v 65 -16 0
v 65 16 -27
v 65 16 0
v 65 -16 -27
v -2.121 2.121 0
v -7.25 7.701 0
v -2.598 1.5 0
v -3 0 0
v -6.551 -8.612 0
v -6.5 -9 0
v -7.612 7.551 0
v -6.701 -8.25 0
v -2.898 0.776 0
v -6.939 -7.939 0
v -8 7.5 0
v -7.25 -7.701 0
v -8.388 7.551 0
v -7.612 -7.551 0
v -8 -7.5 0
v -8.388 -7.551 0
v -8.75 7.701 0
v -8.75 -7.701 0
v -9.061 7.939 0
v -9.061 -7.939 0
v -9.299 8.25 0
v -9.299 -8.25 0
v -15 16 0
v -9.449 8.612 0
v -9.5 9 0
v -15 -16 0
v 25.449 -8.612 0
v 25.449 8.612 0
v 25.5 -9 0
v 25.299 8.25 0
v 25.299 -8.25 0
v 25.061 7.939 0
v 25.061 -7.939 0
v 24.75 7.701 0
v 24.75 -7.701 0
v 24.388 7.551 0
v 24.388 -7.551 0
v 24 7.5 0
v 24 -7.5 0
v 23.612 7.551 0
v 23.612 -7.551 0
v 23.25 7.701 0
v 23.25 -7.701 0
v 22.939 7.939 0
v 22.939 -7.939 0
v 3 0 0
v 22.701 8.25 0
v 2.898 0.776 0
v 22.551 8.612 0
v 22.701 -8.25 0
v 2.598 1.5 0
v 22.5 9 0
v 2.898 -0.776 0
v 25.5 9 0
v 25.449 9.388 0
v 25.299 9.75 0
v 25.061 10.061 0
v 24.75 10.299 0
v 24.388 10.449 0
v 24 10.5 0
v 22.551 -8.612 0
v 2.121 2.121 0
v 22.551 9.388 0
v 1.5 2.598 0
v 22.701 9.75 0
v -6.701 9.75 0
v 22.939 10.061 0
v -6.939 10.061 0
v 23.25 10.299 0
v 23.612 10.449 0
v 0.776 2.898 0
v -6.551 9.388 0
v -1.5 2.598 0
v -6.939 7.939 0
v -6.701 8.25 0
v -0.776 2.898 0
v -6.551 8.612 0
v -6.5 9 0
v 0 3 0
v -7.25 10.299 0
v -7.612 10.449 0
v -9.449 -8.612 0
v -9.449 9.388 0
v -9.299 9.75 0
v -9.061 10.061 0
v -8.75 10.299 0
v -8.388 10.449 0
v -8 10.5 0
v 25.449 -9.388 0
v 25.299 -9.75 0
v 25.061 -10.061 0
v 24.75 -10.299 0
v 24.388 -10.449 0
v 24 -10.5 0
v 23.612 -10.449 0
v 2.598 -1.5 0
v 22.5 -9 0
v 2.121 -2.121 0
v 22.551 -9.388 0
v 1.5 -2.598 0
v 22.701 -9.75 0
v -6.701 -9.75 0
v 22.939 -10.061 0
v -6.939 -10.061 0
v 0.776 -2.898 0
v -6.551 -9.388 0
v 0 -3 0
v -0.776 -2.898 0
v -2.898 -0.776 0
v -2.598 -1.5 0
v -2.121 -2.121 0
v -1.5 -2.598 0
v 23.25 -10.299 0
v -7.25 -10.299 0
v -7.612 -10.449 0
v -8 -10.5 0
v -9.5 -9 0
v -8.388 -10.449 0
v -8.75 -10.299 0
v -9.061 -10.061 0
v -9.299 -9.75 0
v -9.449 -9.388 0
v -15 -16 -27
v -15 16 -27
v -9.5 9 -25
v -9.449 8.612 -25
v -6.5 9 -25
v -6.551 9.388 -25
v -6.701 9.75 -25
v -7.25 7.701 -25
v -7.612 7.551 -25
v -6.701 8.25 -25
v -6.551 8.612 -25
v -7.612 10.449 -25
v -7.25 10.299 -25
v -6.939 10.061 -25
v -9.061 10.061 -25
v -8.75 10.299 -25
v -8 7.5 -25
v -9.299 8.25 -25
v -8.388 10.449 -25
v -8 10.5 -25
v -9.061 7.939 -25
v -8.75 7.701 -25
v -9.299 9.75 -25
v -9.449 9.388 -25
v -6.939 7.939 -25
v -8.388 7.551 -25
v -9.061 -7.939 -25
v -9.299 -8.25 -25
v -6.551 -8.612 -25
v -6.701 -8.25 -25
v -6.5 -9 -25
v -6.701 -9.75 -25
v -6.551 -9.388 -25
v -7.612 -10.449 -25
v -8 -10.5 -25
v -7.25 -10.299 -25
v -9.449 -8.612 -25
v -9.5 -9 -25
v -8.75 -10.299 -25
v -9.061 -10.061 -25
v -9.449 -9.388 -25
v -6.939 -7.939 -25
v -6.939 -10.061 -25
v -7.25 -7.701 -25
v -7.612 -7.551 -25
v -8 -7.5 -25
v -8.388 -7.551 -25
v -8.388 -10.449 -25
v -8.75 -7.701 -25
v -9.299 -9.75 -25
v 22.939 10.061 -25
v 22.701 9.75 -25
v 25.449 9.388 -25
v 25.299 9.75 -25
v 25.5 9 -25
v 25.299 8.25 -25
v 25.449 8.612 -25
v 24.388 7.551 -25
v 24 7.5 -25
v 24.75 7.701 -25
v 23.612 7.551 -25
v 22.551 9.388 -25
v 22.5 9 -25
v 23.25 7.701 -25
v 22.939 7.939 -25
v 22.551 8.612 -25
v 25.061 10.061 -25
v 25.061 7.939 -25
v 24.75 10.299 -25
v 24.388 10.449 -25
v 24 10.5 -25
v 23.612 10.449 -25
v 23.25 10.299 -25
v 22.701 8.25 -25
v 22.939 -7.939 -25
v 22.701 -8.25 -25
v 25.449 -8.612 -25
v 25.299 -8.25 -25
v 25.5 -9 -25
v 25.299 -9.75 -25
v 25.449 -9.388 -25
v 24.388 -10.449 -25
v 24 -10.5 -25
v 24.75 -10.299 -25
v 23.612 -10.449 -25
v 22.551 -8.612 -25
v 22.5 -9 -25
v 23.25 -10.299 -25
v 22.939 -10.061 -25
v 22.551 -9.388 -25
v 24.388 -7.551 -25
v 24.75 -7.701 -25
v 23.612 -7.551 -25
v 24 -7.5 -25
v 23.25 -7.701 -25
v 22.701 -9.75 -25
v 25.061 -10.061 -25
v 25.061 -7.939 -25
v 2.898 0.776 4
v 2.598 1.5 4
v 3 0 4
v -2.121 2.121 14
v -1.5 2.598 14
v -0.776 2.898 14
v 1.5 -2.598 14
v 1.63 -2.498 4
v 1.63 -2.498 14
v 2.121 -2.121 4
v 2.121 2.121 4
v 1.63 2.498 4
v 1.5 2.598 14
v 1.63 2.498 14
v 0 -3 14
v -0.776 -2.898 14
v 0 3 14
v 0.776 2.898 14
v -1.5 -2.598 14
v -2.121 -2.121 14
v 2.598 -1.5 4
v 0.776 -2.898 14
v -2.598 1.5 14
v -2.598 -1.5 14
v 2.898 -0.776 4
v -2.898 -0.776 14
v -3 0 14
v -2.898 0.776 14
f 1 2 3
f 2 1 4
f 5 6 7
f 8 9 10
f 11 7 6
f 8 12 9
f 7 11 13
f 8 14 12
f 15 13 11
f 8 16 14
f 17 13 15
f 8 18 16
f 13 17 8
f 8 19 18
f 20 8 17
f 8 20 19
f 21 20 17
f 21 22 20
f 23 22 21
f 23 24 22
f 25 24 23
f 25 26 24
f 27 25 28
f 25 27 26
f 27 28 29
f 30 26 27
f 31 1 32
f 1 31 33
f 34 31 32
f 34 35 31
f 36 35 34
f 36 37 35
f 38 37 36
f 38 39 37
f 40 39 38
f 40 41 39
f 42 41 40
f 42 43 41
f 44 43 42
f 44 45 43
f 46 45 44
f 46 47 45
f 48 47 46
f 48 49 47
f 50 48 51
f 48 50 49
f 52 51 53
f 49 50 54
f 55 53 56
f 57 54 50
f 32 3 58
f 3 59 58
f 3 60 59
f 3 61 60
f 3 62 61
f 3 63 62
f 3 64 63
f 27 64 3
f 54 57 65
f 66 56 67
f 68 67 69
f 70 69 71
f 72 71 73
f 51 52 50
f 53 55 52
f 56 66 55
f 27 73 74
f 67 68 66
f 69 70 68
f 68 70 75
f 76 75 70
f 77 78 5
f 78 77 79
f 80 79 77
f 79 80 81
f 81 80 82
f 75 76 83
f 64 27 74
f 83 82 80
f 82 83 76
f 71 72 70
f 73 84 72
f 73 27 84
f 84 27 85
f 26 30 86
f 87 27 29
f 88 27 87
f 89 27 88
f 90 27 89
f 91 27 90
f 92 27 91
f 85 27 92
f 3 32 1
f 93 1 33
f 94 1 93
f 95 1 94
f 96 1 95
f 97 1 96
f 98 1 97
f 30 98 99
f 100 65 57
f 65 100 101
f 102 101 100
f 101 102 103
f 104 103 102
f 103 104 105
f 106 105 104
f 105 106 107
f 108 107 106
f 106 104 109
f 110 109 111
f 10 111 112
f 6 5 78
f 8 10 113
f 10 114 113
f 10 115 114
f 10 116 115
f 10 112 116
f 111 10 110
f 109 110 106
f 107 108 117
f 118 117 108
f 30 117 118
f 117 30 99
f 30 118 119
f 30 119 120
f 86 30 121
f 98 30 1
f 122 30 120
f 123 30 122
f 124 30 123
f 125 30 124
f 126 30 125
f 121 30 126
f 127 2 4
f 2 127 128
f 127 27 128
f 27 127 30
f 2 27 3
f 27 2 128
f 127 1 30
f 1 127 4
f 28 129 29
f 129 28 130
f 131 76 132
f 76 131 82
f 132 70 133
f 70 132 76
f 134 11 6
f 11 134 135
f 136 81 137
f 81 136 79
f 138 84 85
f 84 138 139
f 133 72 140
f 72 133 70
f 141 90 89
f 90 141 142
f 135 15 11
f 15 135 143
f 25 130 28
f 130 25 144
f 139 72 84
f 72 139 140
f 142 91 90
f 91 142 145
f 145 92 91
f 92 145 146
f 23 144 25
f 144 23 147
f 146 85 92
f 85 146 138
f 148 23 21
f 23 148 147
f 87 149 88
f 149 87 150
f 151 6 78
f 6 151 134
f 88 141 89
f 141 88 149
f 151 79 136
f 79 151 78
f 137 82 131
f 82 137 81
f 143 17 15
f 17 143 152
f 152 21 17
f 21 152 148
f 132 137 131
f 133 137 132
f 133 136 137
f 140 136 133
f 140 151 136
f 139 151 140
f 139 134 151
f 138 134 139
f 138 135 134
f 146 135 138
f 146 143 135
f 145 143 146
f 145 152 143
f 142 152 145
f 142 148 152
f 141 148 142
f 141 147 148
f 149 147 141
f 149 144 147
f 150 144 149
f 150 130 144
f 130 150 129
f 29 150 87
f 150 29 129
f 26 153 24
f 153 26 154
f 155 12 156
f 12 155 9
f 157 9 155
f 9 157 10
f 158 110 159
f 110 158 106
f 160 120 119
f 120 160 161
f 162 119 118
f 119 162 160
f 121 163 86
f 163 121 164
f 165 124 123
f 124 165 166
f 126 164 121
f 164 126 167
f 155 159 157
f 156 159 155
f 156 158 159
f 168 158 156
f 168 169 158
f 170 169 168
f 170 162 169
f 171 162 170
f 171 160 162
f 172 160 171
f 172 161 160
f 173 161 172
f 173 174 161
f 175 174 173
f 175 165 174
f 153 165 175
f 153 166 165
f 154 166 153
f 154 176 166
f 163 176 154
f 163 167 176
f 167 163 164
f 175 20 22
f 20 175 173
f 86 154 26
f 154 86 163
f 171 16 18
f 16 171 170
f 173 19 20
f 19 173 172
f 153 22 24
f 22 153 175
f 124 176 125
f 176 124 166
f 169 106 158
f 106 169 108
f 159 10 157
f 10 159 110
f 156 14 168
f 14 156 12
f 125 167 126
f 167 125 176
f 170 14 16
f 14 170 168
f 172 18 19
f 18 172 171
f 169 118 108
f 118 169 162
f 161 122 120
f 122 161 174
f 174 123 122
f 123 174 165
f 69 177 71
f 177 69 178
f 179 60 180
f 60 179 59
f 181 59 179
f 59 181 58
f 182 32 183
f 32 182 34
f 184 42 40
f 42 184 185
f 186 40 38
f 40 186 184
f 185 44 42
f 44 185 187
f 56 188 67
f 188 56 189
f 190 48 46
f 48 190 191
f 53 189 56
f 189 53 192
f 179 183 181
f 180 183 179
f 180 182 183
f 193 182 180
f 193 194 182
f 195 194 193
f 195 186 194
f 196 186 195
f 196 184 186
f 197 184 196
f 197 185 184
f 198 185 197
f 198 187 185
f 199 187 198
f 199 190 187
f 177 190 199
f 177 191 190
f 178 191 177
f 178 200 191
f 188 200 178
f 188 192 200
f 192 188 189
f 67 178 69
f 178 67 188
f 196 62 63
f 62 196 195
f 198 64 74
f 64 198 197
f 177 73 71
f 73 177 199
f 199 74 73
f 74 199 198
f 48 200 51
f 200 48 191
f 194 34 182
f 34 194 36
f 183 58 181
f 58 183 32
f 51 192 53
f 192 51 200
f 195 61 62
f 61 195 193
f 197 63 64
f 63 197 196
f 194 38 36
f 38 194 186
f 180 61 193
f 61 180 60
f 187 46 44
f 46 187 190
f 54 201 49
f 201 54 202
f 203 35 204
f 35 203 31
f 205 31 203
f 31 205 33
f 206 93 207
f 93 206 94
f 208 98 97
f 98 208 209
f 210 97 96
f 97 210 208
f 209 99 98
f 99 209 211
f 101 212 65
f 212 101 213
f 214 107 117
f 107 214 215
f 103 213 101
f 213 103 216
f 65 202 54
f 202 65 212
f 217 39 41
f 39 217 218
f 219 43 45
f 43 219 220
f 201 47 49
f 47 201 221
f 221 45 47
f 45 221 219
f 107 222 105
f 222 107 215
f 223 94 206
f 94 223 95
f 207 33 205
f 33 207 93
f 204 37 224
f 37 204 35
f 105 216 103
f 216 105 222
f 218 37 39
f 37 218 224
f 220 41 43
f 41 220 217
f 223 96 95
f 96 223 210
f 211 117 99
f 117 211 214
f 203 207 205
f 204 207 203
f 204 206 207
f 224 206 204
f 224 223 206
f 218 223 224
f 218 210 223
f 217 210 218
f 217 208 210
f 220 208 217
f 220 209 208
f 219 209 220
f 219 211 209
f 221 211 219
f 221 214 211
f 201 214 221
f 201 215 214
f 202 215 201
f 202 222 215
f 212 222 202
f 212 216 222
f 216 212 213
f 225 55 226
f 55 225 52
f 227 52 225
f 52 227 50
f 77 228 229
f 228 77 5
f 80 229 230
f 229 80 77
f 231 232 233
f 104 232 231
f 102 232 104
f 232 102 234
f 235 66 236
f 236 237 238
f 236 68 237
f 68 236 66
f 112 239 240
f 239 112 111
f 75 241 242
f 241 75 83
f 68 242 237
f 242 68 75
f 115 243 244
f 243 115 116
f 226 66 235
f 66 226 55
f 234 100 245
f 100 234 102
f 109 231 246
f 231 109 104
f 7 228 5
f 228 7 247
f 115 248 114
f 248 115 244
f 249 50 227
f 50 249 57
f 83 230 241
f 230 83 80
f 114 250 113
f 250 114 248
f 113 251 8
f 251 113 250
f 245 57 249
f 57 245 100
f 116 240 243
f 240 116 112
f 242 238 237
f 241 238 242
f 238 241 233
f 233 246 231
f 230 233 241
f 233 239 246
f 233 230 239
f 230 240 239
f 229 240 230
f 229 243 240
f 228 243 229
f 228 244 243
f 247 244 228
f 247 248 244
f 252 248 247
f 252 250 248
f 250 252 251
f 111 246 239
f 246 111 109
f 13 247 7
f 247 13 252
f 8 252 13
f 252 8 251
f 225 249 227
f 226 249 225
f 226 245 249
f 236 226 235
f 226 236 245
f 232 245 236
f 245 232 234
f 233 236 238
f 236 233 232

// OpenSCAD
$fn=24;
motor_shaft_or = 3;
motor_notched_w = 4.37;
motor_notch_h = 10;
motor_shaft_h = 14;
motor_shaft_offs = 15;
motor_w = 32;
motor_l = 80;
motor_h = 27;
motor_hole_sep = [18, 32];
motor_hole_ir = 3/2;
motor_hole_offs = 7;


module motor() {
    translate([-motor_shaft_offs, -motor_w/2, -motor_h]) {
        difference() {
            cube([motor_l, motor_w, motor_h]);
            translate([motor_hole_offs, motor_w / 2 + motor_hole_sep[0]/2, 2])
                cylinder(r=motor_hole_ir, h=motor_h);
            translate([motor_hole_offs, motor_w / 2 - motor_hole_sep[0]/2, 2])
                cylinder(r=motor_hole_ir, h=motor_h);
            translate([motor_hole_offs + motor_hole_sep[1], motor_w / 2 + motor_hole_sep[0]/2, 2])
                cylinder(r=motor_hole_ir, h=motor_h);
            translate([motor_hole_offs + motor_hole_sep[1], motor_w / 2 - motor_hole_sep[0]/2, 2])
                cylinder(r=motor_hole_ir, h=motor_h);
        }
    }
        
    difference() {
        cylinder(r=motor_shaft_or, h=motor_shaft_h);
        translate([2*motor_shaft_or - motor_notched_w, -motor_shaft_or, motor_shaft_h - motor_notch_h])
            cube([2*motor_shaft_or, 2*motor_shaft_or, motor_notch_h]);
    }
}

motor();
